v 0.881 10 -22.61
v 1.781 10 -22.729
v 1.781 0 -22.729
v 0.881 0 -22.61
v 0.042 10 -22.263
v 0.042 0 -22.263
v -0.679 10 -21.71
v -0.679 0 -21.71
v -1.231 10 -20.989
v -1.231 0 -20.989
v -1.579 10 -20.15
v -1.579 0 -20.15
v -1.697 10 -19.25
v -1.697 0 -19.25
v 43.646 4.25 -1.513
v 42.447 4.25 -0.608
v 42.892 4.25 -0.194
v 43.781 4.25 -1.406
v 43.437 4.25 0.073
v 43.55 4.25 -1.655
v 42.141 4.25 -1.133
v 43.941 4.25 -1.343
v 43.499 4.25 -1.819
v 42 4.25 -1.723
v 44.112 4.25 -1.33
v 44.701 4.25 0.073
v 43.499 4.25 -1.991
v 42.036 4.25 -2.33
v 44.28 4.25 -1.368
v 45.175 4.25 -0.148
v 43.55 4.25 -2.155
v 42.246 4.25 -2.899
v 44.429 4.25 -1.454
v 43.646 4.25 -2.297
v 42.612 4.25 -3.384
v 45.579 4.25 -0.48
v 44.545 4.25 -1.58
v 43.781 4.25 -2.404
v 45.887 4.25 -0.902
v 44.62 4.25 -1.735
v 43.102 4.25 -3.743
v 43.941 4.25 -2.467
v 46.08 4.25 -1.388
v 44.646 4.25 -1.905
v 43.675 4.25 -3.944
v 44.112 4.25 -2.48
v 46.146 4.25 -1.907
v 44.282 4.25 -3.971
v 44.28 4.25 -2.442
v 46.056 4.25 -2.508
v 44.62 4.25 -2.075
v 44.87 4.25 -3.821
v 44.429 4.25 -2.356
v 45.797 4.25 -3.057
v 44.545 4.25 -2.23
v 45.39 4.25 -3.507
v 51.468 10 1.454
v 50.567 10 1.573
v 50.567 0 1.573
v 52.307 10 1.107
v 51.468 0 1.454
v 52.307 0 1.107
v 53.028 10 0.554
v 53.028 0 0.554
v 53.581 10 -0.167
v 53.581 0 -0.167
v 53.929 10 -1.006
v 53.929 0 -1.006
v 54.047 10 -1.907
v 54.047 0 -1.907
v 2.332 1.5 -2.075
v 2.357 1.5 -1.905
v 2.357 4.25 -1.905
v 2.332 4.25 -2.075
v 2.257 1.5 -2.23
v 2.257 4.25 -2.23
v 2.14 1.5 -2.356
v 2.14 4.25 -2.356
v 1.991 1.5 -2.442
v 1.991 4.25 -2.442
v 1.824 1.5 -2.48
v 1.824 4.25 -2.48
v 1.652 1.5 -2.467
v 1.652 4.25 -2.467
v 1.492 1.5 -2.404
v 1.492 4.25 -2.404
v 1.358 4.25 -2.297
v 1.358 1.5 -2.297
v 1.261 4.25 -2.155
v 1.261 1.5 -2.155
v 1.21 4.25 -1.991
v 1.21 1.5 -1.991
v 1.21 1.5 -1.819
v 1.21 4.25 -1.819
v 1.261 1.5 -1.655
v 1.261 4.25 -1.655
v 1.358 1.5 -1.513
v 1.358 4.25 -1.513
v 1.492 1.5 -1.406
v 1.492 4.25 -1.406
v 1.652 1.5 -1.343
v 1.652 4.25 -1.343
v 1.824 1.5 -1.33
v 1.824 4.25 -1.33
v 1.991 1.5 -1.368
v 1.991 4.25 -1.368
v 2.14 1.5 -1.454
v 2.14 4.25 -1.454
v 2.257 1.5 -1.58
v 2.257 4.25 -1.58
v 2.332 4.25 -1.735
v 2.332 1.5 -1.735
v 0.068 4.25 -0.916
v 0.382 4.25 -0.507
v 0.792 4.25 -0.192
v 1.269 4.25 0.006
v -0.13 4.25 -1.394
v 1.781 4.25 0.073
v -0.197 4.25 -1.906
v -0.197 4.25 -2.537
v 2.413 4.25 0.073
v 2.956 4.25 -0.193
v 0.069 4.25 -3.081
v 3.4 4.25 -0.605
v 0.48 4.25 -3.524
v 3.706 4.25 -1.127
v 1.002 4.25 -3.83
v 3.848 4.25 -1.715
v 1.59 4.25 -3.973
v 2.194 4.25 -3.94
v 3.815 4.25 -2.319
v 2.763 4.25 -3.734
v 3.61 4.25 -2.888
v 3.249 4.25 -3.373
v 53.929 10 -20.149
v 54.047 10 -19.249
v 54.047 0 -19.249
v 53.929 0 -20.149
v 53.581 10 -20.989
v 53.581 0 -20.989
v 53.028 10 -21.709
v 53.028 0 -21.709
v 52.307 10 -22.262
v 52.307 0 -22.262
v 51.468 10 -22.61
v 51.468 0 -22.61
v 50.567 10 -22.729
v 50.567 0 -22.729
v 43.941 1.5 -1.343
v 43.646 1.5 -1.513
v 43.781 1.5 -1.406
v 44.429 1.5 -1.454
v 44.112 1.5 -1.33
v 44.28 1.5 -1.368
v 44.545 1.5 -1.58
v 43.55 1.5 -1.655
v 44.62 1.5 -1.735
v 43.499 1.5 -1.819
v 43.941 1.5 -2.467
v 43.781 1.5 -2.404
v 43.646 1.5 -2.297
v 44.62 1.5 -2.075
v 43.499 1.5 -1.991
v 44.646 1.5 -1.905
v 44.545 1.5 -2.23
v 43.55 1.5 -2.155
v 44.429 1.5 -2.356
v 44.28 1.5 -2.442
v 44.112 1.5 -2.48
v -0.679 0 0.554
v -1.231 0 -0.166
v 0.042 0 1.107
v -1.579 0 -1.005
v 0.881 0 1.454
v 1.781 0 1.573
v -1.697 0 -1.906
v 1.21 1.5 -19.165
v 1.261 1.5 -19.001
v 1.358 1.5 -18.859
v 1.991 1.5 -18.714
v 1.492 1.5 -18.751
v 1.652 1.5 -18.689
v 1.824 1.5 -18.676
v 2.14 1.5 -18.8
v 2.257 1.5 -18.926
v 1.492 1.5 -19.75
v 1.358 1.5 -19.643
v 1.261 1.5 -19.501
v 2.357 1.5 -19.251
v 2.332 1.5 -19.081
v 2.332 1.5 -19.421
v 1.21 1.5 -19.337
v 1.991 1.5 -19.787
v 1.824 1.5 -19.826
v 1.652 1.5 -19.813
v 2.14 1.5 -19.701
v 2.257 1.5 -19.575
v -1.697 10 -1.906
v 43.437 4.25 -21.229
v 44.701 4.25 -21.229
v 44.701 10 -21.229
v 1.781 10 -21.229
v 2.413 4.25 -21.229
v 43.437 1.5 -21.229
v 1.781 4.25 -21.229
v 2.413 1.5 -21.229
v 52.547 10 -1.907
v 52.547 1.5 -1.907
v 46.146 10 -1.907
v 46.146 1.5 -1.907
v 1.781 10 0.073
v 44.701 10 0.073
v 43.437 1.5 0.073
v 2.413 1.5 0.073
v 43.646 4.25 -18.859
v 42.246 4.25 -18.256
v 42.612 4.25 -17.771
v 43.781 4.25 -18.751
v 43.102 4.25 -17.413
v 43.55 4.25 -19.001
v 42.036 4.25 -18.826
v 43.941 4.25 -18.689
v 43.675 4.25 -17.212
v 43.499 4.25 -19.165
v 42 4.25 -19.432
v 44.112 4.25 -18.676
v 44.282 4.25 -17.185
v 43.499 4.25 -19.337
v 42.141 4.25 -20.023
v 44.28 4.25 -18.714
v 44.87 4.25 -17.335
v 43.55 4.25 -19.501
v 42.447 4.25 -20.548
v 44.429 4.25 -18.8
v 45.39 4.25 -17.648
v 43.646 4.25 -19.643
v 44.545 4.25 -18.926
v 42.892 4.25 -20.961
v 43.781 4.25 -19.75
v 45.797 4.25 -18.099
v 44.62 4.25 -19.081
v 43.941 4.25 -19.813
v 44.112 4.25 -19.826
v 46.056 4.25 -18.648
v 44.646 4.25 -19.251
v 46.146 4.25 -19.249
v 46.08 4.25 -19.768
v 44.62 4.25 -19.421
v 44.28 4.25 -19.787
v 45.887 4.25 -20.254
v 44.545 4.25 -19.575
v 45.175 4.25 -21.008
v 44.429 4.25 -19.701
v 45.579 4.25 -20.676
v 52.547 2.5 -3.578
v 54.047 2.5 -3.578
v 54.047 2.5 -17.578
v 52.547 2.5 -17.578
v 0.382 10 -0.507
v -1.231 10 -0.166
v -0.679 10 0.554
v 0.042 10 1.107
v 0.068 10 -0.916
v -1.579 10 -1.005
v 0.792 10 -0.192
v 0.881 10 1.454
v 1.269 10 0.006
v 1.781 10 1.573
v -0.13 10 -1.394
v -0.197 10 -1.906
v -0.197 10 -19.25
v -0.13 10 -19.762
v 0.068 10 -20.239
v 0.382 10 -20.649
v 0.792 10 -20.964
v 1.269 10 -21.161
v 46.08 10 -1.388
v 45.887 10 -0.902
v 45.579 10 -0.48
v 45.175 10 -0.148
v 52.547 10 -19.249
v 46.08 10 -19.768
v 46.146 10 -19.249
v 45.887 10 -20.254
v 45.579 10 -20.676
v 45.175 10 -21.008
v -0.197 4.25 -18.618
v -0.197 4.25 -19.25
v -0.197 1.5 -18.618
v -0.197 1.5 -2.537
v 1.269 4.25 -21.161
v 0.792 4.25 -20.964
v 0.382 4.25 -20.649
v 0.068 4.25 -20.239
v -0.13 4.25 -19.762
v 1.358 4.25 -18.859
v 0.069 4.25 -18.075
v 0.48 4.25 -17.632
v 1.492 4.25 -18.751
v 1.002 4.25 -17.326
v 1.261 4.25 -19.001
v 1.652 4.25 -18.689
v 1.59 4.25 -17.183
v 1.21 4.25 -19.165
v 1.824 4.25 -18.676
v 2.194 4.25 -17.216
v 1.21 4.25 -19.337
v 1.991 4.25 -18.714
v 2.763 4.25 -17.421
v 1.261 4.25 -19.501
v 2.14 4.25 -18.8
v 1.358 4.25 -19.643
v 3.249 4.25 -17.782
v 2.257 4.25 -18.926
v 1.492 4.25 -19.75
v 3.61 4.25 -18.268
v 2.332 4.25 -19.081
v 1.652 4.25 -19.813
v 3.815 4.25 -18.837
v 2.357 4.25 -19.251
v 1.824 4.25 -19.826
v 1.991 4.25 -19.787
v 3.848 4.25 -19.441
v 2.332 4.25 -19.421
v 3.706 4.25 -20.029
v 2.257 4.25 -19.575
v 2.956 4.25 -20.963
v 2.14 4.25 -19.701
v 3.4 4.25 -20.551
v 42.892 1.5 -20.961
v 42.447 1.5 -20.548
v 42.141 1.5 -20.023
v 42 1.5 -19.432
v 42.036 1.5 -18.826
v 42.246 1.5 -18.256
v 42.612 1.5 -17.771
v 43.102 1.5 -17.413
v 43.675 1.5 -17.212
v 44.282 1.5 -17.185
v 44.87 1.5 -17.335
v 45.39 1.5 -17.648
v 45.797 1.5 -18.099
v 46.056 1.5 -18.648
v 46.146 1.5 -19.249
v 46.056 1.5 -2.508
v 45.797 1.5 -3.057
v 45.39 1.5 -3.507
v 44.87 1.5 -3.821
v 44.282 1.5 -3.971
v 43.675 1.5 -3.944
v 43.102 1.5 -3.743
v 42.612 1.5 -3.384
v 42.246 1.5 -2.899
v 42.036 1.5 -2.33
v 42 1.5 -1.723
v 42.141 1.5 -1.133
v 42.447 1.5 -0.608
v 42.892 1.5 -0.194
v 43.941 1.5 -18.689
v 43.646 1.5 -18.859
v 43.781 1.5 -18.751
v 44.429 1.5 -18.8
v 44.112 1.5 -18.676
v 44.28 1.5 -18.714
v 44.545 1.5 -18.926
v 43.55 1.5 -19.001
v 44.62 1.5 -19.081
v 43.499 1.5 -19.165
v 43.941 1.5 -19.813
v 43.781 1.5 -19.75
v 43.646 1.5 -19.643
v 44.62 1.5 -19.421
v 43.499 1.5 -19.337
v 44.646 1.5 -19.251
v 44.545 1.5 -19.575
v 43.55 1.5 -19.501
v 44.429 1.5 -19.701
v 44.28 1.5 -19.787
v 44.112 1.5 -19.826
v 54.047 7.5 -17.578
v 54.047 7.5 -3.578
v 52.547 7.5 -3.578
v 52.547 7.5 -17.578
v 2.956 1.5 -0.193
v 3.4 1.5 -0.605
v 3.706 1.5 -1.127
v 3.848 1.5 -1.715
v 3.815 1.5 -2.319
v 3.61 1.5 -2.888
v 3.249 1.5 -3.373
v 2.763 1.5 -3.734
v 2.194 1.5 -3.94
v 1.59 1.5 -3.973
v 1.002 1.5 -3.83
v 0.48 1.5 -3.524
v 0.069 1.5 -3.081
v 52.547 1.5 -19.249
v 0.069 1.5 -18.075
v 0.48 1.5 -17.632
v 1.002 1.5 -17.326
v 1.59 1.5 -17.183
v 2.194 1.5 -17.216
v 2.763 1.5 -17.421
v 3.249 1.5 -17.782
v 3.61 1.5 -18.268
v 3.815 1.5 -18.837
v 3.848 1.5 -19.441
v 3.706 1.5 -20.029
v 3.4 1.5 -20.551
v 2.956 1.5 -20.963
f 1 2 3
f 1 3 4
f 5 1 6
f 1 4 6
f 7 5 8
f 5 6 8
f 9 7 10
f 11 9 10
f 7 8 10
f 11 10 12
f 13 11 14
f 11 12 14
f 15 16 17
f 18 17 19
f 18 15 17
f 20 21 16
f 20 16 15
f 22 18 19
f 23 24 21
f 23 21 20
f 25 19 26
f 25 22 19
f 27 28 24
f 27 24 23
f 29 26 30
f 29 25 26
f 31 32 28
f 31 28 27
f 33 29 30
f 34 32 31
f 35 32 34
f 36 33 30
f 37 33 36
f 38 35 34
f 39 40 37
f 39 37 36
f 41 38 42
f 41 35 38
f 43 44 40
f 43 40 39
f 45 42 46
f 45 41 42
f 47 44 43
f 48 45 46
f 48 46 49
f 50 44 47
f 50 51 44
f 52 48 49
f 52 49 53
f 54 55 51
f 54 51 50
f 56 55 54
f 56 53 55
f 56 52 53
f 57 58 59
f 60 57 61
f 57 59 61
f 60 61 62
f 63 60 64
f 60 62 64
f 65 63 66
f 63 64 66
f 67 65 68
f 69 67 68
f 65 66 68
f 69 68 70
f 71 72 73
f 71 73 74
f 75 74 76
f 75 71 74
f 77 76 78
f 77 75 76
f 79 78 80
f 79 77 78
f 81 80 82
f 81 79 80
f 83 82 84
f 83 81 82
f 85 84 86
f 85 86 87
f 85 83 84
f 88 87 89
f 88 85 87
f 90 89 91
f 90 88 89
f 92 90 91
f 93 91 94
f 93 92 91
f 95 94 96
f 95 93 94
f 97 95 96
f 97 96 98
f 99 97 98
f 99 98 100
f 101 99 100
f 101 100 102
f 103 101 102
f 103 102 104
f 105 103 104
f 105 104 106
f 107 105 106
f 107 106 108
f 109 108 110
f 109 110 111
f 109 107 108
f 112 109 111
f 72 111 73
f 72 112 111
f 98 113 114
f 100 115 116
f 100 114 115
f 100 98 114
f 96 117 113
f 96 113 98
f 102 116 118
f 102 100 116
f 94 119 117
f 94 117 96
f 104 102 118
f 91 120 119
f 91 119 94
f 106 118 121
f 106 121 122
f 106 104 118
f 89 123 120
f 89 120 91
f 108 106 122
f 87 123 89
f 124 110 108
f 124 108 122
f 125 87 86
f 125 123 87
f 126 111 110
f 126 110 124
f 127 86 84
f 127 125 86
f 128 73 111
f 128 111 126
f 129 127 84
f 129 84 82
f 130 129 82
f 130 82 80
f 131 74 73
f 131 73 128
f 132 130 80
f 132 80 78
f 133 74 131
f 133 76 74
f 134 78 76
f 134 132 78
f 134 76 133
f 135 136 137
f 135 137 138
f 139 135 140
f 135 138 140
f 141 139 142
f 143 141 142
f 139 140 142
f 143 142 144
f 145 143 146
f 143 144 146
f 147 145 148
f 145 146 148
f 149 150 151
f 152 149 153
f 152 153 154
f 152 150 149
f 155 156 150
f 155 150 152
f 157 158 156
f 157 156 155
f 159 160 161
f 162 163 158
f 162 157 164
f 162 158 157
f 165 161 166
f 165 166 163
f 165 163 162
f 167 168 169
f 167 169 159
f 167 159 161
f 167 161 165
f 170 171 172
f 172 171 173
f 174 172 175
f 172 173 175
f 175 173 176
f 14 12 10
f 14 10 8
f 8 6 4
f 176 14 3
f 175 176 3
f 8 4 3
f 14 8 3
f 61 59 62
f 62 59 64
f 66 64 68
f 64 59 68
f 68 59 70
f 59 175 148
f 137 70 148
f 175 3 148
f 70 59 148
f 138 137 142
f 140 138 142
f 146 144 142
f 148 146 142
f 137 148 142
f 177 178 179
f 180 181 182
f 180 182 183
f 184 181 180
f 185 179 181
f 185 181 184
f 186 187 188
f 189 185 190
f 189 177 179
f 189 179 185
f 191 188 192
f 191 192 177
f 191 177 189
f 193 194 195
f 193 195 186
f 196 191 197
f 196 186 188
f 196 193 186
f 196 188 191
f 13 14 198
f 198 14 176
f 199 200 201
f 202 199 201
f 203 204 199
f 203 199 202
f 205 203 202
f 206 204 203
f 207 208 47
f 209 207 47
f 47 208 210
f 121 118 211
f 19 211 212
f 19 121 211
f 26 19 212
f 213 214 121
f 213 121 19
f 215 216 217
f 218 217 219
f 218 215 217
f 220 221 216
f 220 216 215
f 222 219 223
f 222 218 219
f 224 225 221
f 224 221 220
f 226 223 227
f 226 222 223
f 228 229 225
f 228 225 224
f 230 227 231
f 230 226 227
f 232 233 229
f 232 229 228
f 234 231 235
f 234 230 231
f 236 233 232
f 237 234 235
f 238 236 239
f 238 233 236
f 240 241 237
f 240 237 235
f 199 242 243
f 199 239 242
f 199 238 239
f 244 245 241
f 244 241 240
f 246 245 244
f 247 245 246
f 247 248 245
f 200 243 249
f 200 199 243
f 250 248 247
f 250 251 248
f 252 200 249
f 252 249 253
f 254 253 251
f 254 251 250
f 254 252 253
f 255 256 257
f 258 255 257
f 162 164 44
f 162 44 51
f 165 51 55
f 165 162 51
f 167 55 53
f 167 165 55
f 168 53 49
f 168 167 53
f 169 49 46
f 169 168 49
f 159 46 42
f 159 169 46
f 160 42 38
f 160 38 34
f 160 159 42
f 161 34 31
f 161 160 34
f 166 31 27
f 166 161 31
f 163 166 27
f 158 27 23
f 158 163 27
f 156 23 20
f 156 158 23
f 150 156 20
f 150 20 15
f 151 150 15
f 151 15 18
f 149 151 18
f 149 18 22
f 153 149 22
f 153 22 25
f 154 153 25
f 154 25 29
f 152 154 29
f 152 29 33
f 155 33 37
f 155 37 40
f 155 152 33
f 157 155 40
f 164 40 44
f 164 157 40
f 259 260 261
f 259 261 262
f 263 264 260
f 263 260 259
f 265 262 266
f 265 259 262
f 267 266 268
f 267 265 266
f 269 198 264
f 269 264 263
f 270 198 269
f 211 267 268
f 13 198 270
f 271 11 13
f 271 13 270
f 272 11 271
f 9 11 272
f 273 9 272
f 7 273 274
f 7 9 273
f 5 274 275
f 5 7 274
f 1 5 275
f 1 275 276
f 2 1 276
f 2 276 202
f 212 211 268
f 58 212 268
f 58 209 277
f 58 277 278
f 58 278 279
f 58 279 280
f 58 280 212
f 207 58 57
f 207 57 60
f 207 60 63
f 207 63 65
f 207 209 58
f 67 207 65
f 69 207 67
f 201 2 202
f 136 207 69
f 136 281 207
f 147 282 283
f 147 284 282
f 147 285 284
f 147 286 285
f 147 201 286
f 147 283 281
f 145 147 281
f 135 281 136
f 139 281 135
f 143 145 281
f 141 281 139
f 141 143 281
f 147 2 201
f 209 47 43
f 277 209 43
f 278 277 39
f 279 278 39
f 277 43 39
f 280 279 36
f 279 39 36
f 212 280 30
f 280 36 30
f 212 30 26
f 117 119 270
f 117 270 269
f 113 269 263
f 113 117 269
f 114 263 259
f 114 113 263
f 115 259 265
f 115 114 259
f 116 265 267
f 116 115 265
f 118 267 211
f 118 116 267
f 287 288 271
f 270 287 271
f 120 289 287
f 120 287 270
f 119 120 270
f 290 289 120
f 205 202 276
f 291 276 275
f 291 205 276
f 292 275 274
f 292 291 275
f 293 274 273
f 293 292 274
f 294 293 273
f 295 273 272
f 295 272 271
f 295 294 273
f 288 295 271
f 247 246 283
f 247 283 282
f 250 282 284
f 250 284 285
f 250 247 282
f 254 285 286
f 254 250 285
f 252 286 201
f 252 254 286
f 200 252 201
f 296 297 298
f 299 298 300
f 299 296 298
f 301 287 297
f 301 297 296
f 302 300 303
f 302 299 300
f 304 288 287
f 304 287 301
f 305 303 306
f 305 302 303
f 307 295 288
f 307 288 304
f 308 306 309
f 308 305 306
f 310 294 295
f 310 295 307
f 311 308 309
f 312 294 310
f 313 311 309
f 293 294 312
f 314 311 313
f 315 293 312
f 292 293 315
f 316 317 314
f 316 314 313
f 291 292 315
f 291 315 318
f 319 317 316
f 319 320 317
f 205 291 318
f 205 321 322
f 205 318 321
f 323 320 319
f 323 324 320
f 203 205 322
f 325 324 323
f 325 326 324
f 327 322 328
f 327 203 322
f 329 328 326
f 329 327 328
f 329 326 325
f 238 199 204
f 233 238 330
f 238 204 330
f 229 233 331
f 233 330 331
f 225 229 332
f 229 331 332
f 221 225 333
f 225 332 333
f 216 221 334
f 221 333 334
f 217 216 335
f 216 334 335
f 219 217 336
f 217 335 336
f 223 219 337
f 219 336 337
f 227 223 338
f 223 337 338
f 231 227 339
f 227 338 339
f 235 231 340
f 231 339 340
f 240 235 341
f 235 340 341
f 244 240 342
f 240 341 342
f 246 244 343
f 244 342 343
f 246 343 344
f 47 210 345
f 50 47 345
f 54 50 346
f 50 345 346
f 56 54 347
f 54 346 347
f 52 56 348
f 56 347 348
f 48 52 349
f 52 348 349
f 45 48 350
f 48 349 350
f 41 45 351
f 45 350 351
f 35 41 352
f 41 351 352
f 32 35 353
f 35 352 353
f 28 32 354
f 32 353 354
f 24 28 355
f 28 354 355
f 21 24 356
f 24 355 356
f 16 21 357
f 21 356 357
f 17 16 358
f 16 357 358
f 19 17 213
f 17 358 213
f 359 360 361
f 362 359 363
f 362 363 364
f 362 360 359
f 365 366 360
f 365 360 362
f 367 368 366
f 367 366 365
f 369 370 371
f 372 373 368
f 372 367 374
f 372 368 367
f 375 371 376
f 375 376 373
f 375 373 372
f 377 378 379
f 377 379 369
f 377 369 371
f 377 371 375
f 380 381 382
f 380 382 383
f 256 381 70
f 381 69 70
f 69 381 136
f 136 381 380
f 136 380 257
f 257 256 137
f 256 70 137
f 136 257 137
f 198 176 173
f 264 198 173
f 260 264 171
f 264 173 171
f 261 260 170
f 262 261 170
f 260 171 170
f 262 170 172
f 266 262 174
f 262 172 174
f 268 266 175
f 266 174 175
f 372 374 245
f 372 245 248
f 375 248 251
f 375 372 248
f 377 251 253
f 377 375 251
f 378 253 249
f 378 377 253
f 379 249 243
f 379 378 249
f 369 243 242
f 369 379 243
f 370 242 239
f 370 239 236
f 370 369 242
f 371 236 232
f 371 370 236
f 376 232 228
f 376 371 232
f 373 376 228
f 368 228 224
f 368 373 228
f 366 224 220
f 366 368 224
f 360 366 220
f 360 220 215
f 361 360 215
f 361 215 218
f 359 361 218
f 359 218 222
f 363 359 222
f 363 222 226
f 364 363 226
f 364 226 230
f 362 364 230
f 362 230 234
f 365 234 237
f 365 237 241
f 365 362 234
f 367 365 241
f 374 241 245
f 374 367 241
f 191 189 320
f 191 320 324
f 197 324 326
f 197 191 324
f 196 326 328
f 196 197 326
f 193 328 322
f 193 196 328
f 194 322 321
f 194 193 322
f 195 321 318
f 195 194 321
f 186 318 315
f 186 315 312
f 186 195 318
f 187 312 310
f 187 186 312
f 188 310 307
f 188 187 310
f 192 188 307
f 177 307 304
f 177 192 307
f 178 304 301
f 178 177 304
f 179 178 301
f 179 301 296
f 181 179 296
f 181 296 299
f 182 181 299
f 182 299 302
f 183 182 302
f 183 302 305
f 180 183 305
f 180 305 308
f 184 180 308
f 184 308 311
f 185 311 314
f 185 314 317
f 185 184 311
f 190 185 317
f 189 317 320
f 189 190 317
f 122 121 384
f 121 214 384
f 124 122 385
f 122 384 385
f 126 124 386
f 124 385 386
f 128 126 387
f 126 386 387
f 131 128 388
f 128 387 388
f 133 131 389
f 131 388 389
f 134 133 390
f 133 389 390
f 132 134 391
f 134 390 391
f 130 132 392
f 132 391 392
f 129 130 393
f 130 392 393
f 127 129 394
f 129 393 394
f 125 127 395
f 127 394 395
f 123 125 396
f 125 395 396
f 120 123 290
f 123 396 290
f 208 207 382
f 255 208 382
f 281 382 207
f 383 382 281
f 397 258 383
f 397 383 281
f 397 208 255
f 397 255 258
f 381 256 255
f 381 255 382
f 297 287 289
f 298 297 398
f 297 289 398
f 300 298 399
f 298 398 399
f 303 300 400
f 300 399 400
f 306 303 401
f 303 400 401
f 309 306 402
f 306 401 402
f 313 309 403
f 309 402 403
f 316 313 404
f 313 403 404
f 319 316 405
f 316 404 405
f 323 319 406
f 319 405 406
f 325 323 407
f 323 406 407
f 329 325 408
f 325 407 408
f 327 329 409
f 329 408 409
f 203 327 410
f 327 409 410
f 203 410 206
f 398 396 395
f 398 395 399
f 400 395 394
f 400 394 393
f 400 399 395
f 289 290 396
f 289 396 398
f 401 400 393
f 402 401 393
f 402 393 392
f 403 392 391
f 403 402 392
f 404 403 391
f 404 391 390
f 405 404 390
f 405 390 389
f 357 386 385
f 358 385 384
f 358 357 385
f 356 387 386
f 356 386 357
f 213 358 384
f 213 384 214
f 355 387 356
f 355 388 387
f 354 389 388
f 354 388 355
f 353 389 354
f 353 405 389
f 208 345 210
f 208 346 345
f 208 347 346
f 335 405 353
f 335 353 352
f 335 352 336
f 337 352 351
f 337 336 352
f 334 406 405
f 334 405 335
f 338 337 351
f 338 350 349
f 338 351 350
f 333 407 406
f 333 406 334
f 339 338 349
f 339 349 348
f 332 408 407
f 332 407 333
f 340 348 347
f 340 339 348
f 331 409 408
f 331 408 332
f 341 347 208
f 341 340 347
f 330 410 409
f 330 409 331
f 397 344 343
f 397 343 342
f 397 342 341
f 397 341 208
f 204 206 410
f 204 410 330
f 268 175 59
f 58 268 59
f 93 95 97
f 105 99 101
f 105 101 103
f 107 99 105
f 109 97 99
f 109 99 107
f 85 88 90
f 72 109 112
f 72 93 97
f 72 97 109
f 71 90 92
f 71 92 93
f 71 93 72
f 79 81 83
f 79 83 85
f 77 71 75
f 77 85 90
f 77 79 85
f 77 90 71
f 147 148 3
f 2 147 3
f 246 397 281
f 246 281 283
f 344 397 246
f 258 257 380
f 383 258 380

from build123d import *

# Parameters (mm, degrees)
EXTRUDE_4_DEPTH     = 10
EXTRUDE_3_DEPTH     = 1.5
CUT_EXTRUDE_2_REACH = 57.745
SKETCH_7_W          = 14
SKETCH_7_H          = 5
SKETCH_8_R          = 2.076581153
SKETCH_8_R_2        = 0.576581153
EXTRUDE_5_DEPTH     = 2.75
EXTRUDE_4_2_DEPTH   = 8.5


with BuildPart() as part:
    # 草图3 → Extrude 4 (new body)
    with BuildSketch(Plane(origin=(0, 0, 0), x_dir=(1, 0, 0), z_dir=(0, 1, 0))):
        with BuildLine():
            Line((50.567091694, 22.728702057), (1.78119206, 22.728702057))
            ThreePointArc((1.78119206, 22.728702057), (-0.678586397, 21.70982846), (-1.697459995, 19.250050003))
            Line((-1.697459995, 19.250050003), (-1.697459995, 1.905652309))
            ThreePointArc((-1.697459995, 1.905652309), (-0.678586397, -0.554126149), (1.78119206, -1.572999746))
            Line((1.78119206, -1.572999746), (50.567091694, -1.572999746))
            ThreePointArc((50.567091694, -1.572999746), (53.027823293, -0.553731345), (54.047091694, 1.907000254))
            Line((54.047091694, 1.907000254), (54.047091694, 19.248702057))
            ThreePointArc((54.047091694, 19.248702057), (53.027823293, 21.709433656), (50.567091694, 22.728702057))
        make_face()
        with BuildLine():
            Line((50.567091694, 21.228702057), (1.78119206, 21.228702057))
            ThreePointArc((1.78119206, 21.228702057), (0.382073774, 20.649168288), (-0.197459995, 19.250050003))
            Line((-0.197459995, 19.250050003), (-0.197459995, 1.905652309))
            ThreePointArc((-0.197459995, 1.905652309), (0.382073774, 0.506534023), (1.78119206, -0.072999746))
            Line((1.78119206, -0.072999746), (50.567091694, -0.072999746))
            ThreePointArc((50.567091694, -0.072999746), (51.967163121, 0.506928827), (52.547091694, 1.907000254))
            Line((52.547091694, 1.907000254), (52.547091694, 19.248702057))
            ThreePointArc((52.547091694, 19.248702057), (51.967163121, 20.648773484), (50.567091694, 21.228702057))
        make_face(mode=Mode.SUBTRACT)
    extrude(amount=EXTRUDE_4_DEPTH)

    # 草图3<5> → 凸台-拉伸3 (add)
    with BuildSketch(Plane(origin=(0, 0, 0), x_dir=(1, 0, 0), z_dir=(0, 1, 0))):
        with BuildLine():
            Line((50.567091694, 21.228702057), (1.78119206, 21.228702057))
            ThreePointArc((1.78119206, 21.228702057), (0.382073774, 20.649168288), (-0.197459995, 19.250050003))
            Line((-0.197459995, 19.250050003), (-0.197459995, 1.905652309))
            ThreePointArc((-0.197459995, 1.905652309), (0.382073774, 0.506534023), (1.78119206, -0.072999746))
            Line((1.78119206, -0.072999746), (50.567091694, -0.072999746))
            ThreePointArc((50.567091694, -0.072999746), (51.967163121, 0.506928827), (52.547091694, 1.907000254))
            Line((52.547091694, 1.907000254), (52.547091694, 19.248702057))
            ThreePointArc((52.547091694, 19.248702057), (51.967163121, 20.648773484), (50.567091694, 21.228702057))
        make_face()
    extrude(amount=EXTRUDE_3_DEPTH)

    # 草图7 → 切除-拉伸2 (cut, up to next)
    with BuildSketch(Plane(origin=(54.047091694, 0, 0), x_dir=(0, 0, -1), z_dir=(1, 0, 0)), mode=Mode.PRIVATE) as cut_extrude_2_sk1:
        with Locations((10.577851156, 5)):
            Rectangle(SKETCH_7_W, SKETCH_7_H)
    cut_extrude_2_tool1 = extrude(cut_extrude_2_sk1.sketch, amount=-CUT_EXTRUDE_2_REACH, mode=Mode.PRIVATE) & part.part
    add(cut_extrude_2_tool1.solids().sort_by_distance((54.047092, 5, -10.577851))[0], mode=Mode.SUBTRACT)

    # 草图8 → 拉伸-薄壁5 (add)
    with BuildSketch(Plane(origin=(0, 1.5, 0), x_dir=(1, 0, 0), z_dir=(0, 1, 0))):
        with Locations((44.069088138, 1.90500381)):
            Circle(SKETCH_8_R)
        with Locations((44.069088138, 1.90500381)):
            Circle(SKETCH_8_R_2, mode=Mode.SUBTRACT)
        with Locations((44.069088138, 19.250698501)):
            Circle(SKETCH_8_R)
        with Locations((44.069088138, 19.250698501)):
            Circle(SKETCH_8_R_2, mode=Mode.SUBTRACT)
        with Locations((1.780543561, 19.250698501)):
            Circle(SKETCH_8_R)
        with Locations((1.780543561, 19.250698501)):
            Circle(SKETCH_8_R_2, mode=Mode.SUBTRACT)
        with Locations((1.780543561, 1.90500381)):
            Circle(SKETCH_8_R)
        with Locations((1.780543561, 1.90500381)):
            Circle(SKETCH_8_R_2, mode=Mode.SUBTRACT)
    extrude(amount=EXTRUDE_5_DEPTH)

    # 草图9 → Extrude 4 2 (add)
    with BuildSketch(Plane(origin=(0, 1.5, 0), x_dir=(1, 0, 0), z_dir=(0, 1, 0))):
        with BuildLine():
            Line((44.70129951, -0.072999746), (50.567091694, -0.072999746))
            ThreePointArc((50.567091694, -0.072999746), (51.967163121, 0.506928827), (52.547091694, 1.907000254))
            Line((52.547091694, 1.907000254), (46.145668332, 1.907000254))
            ThreePointArc((46.145668332, 1.907000254), (45.746731704, 0.681197718), (44.70129951, -0.072999746))
        make_face()
        with BuildLine():
            Line((44.70129951, 21.228702057), (50.567091694, 21.228702057))
            ThreePointArc((50.567091694, 21.228702057), (51.967163121, 20.648773484), (52.547091694, 19.248702057))
            Line((52.547091694, 19.248702057), (46.145668332, 19.248702057))
            ThreePointArc((46.145668332, 19.248702057), (45.746731704, 20.474504593), (44.70129951, 21.228702057))
        make_face()
    extrude(amount=EXTRUDE_4_2_DEPTH)


solid = part.part
